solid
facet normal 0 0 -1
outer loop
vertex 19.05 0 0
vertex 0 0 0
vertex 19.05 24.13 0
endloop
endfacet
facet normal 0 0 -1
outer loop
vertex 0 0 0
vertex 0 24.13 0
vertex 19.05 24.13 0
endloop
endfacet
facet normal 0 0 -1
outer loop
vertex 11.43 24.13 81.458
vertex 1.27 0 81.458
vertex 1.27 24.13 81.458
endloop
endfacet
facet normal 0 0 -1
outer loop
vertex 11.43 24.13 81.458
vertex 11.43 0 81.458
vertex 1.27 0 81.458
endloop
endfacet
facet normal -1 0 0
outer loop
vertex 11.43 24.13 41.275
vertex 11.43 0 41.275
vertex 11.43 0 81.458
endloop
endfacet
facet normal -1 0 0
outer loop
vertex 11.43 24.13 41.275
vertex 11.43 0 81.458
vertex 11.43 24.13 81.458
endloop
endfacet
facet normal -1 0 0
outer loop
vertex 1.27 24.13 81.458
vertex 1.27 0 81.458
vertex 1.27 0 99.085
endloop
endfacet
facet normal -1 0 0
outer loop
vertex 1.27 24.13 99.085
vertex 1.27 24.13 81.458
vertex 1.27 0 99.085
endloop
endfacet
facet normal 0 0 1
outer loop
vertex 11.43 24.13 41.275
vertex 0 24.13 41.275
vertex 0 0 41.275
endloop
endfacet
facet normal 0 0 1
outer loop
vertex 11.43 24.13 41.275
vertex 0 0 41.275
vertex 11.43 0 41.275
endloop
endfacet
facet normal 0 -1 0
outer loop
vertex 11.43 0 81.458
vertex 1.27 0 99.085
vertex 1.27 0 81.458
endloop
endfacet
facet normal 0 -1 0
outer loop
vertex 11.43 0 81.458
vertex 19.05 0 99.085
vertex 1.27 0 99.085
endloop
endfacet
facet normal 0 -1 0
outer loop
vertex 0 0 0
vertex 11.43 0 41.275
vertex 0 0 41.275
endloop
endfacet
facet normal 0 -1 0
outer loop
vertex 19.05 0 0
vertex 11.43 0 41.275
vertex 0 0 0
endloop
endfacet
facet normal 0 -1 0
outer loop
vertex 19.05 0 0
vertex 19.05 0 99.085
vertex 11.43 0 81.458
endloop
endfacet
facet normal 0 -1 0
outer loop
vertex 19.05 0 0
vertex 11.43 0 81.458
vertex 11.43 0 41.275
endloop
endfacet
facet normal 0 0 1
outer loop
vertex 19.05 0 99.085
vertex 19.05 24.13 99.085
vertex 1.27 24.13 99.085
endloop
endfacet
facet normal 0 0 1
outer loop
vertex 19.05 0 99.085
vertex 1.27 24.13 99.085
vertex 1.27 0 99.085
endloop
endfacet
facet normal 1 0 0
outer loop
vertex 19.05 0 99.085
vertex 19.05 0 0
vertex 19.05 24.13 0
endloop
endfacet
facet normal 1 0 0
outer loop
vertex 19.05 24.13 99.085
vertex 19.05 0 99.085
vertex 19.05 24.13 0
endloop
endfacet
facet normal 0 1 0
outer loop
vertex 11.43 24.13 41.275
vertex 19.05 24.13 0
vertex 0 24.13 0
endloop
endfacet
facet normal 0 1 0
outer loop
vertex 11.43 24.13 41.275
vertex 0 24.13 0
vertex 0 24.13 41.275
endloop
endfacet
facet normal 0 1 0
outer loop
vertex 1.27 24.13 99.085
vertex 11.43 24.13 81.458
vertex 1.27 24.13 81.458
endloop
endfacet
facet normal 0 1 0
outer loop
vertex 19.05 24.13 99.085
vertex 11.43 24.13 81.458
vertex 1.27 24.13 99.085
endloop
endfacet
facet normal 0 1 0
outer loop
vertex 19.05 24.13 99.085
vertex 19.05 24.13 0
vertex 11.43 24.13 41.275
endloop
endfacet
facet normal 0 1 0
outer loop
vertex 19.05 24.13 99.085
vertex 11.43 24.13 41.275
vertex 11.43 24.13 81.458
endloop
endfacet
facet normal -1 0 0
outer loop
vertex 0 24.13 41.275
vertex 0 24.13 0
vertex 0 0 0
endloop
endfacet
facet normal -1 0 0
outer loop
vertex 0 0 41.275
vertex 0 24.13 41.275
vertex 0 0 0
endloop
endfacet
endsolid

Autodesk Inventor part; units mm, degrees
ref_plane "YZ Plane" through (0, 0, 0) normal (1, 0, 0) x (0, 1, 0)
ref_plane "XZ Plane" through (0, 0, 0) normal (0, 1, 0) x (-1, 0, 0)
ref_plane "XY Plane" through (0, 0, 0) normal (0, 0, 1) x (1, 0, 0)
sketch "Sketch1" plane through (0, 0, 0) normal (0, 0, 1) x (1, 0, 0)
  line L0 (0, 0) -> (19.05, 0)
  line L1 (19.05, 0) -> (19.05, 24.13)
  line L2 (19.05, 24.13) -> (0, 24.13)
  line L3 (0, 24.13) -> (0, 0)
  dimension "d0" = 19.05
  dimension "d1" = 24.13
extrude "Extrusion1" add sketch "Sketch1" along normal blind 41.275
sketch "Sketch3" plane through (0, 0, 41.275) normal (0, 0, 1) x (1, 0, 0)
  line L0 (19.05, 24.13) -> (0, 24.13) projected
  line L1 (19.05, 0) -> (11.43, 0)
  line L2 (11.43, 0) -> (11.43, 24.13)
  line L3 (11.43, 24.13) -> (19.05, 24.13)
  line L4 (19.05, 24.13) -> (19.05, 0)
  line L5 (19.05, 0) -> (19.05, 24.13) projected
  point P0 (0, 0)
  dimension "d4" = 24.13
  dimension "d5" = 0
  dimension "d6" = 7.62
extrude "Extrusion2" add sketch "Sketch3" along normal blind 57.8104
sketch "Sketch4" plane through (11.43, 0, 41.275) normal (-1, 0, 0) x (0, 0, 1)
  line L0 (-41.275, 24.13) -> (57.8104, 24.13) projected
  line L1 (57.8104, 0) -> (40.1828, 0)
  line L2 (40.1828, 0) -> (40.1828, 24.13)
  line L3 (40.1828, 24.13) -> (57.8104, 24.13)
  line L4 (57.8104, 24.13) -> (57.8104, 0)
  line L5 (57.8104, 24.13) -> (57.8104, 0) projected
  point P0 (-41.275, 0)
  dimension "d9" = 24.13
  dimension "d10" = 0
  dimension "d11" = 17.6276
extrude "Extrusion3" add sketch "Sketch4" along normal blind 10.16
properties part number "Claw base"
